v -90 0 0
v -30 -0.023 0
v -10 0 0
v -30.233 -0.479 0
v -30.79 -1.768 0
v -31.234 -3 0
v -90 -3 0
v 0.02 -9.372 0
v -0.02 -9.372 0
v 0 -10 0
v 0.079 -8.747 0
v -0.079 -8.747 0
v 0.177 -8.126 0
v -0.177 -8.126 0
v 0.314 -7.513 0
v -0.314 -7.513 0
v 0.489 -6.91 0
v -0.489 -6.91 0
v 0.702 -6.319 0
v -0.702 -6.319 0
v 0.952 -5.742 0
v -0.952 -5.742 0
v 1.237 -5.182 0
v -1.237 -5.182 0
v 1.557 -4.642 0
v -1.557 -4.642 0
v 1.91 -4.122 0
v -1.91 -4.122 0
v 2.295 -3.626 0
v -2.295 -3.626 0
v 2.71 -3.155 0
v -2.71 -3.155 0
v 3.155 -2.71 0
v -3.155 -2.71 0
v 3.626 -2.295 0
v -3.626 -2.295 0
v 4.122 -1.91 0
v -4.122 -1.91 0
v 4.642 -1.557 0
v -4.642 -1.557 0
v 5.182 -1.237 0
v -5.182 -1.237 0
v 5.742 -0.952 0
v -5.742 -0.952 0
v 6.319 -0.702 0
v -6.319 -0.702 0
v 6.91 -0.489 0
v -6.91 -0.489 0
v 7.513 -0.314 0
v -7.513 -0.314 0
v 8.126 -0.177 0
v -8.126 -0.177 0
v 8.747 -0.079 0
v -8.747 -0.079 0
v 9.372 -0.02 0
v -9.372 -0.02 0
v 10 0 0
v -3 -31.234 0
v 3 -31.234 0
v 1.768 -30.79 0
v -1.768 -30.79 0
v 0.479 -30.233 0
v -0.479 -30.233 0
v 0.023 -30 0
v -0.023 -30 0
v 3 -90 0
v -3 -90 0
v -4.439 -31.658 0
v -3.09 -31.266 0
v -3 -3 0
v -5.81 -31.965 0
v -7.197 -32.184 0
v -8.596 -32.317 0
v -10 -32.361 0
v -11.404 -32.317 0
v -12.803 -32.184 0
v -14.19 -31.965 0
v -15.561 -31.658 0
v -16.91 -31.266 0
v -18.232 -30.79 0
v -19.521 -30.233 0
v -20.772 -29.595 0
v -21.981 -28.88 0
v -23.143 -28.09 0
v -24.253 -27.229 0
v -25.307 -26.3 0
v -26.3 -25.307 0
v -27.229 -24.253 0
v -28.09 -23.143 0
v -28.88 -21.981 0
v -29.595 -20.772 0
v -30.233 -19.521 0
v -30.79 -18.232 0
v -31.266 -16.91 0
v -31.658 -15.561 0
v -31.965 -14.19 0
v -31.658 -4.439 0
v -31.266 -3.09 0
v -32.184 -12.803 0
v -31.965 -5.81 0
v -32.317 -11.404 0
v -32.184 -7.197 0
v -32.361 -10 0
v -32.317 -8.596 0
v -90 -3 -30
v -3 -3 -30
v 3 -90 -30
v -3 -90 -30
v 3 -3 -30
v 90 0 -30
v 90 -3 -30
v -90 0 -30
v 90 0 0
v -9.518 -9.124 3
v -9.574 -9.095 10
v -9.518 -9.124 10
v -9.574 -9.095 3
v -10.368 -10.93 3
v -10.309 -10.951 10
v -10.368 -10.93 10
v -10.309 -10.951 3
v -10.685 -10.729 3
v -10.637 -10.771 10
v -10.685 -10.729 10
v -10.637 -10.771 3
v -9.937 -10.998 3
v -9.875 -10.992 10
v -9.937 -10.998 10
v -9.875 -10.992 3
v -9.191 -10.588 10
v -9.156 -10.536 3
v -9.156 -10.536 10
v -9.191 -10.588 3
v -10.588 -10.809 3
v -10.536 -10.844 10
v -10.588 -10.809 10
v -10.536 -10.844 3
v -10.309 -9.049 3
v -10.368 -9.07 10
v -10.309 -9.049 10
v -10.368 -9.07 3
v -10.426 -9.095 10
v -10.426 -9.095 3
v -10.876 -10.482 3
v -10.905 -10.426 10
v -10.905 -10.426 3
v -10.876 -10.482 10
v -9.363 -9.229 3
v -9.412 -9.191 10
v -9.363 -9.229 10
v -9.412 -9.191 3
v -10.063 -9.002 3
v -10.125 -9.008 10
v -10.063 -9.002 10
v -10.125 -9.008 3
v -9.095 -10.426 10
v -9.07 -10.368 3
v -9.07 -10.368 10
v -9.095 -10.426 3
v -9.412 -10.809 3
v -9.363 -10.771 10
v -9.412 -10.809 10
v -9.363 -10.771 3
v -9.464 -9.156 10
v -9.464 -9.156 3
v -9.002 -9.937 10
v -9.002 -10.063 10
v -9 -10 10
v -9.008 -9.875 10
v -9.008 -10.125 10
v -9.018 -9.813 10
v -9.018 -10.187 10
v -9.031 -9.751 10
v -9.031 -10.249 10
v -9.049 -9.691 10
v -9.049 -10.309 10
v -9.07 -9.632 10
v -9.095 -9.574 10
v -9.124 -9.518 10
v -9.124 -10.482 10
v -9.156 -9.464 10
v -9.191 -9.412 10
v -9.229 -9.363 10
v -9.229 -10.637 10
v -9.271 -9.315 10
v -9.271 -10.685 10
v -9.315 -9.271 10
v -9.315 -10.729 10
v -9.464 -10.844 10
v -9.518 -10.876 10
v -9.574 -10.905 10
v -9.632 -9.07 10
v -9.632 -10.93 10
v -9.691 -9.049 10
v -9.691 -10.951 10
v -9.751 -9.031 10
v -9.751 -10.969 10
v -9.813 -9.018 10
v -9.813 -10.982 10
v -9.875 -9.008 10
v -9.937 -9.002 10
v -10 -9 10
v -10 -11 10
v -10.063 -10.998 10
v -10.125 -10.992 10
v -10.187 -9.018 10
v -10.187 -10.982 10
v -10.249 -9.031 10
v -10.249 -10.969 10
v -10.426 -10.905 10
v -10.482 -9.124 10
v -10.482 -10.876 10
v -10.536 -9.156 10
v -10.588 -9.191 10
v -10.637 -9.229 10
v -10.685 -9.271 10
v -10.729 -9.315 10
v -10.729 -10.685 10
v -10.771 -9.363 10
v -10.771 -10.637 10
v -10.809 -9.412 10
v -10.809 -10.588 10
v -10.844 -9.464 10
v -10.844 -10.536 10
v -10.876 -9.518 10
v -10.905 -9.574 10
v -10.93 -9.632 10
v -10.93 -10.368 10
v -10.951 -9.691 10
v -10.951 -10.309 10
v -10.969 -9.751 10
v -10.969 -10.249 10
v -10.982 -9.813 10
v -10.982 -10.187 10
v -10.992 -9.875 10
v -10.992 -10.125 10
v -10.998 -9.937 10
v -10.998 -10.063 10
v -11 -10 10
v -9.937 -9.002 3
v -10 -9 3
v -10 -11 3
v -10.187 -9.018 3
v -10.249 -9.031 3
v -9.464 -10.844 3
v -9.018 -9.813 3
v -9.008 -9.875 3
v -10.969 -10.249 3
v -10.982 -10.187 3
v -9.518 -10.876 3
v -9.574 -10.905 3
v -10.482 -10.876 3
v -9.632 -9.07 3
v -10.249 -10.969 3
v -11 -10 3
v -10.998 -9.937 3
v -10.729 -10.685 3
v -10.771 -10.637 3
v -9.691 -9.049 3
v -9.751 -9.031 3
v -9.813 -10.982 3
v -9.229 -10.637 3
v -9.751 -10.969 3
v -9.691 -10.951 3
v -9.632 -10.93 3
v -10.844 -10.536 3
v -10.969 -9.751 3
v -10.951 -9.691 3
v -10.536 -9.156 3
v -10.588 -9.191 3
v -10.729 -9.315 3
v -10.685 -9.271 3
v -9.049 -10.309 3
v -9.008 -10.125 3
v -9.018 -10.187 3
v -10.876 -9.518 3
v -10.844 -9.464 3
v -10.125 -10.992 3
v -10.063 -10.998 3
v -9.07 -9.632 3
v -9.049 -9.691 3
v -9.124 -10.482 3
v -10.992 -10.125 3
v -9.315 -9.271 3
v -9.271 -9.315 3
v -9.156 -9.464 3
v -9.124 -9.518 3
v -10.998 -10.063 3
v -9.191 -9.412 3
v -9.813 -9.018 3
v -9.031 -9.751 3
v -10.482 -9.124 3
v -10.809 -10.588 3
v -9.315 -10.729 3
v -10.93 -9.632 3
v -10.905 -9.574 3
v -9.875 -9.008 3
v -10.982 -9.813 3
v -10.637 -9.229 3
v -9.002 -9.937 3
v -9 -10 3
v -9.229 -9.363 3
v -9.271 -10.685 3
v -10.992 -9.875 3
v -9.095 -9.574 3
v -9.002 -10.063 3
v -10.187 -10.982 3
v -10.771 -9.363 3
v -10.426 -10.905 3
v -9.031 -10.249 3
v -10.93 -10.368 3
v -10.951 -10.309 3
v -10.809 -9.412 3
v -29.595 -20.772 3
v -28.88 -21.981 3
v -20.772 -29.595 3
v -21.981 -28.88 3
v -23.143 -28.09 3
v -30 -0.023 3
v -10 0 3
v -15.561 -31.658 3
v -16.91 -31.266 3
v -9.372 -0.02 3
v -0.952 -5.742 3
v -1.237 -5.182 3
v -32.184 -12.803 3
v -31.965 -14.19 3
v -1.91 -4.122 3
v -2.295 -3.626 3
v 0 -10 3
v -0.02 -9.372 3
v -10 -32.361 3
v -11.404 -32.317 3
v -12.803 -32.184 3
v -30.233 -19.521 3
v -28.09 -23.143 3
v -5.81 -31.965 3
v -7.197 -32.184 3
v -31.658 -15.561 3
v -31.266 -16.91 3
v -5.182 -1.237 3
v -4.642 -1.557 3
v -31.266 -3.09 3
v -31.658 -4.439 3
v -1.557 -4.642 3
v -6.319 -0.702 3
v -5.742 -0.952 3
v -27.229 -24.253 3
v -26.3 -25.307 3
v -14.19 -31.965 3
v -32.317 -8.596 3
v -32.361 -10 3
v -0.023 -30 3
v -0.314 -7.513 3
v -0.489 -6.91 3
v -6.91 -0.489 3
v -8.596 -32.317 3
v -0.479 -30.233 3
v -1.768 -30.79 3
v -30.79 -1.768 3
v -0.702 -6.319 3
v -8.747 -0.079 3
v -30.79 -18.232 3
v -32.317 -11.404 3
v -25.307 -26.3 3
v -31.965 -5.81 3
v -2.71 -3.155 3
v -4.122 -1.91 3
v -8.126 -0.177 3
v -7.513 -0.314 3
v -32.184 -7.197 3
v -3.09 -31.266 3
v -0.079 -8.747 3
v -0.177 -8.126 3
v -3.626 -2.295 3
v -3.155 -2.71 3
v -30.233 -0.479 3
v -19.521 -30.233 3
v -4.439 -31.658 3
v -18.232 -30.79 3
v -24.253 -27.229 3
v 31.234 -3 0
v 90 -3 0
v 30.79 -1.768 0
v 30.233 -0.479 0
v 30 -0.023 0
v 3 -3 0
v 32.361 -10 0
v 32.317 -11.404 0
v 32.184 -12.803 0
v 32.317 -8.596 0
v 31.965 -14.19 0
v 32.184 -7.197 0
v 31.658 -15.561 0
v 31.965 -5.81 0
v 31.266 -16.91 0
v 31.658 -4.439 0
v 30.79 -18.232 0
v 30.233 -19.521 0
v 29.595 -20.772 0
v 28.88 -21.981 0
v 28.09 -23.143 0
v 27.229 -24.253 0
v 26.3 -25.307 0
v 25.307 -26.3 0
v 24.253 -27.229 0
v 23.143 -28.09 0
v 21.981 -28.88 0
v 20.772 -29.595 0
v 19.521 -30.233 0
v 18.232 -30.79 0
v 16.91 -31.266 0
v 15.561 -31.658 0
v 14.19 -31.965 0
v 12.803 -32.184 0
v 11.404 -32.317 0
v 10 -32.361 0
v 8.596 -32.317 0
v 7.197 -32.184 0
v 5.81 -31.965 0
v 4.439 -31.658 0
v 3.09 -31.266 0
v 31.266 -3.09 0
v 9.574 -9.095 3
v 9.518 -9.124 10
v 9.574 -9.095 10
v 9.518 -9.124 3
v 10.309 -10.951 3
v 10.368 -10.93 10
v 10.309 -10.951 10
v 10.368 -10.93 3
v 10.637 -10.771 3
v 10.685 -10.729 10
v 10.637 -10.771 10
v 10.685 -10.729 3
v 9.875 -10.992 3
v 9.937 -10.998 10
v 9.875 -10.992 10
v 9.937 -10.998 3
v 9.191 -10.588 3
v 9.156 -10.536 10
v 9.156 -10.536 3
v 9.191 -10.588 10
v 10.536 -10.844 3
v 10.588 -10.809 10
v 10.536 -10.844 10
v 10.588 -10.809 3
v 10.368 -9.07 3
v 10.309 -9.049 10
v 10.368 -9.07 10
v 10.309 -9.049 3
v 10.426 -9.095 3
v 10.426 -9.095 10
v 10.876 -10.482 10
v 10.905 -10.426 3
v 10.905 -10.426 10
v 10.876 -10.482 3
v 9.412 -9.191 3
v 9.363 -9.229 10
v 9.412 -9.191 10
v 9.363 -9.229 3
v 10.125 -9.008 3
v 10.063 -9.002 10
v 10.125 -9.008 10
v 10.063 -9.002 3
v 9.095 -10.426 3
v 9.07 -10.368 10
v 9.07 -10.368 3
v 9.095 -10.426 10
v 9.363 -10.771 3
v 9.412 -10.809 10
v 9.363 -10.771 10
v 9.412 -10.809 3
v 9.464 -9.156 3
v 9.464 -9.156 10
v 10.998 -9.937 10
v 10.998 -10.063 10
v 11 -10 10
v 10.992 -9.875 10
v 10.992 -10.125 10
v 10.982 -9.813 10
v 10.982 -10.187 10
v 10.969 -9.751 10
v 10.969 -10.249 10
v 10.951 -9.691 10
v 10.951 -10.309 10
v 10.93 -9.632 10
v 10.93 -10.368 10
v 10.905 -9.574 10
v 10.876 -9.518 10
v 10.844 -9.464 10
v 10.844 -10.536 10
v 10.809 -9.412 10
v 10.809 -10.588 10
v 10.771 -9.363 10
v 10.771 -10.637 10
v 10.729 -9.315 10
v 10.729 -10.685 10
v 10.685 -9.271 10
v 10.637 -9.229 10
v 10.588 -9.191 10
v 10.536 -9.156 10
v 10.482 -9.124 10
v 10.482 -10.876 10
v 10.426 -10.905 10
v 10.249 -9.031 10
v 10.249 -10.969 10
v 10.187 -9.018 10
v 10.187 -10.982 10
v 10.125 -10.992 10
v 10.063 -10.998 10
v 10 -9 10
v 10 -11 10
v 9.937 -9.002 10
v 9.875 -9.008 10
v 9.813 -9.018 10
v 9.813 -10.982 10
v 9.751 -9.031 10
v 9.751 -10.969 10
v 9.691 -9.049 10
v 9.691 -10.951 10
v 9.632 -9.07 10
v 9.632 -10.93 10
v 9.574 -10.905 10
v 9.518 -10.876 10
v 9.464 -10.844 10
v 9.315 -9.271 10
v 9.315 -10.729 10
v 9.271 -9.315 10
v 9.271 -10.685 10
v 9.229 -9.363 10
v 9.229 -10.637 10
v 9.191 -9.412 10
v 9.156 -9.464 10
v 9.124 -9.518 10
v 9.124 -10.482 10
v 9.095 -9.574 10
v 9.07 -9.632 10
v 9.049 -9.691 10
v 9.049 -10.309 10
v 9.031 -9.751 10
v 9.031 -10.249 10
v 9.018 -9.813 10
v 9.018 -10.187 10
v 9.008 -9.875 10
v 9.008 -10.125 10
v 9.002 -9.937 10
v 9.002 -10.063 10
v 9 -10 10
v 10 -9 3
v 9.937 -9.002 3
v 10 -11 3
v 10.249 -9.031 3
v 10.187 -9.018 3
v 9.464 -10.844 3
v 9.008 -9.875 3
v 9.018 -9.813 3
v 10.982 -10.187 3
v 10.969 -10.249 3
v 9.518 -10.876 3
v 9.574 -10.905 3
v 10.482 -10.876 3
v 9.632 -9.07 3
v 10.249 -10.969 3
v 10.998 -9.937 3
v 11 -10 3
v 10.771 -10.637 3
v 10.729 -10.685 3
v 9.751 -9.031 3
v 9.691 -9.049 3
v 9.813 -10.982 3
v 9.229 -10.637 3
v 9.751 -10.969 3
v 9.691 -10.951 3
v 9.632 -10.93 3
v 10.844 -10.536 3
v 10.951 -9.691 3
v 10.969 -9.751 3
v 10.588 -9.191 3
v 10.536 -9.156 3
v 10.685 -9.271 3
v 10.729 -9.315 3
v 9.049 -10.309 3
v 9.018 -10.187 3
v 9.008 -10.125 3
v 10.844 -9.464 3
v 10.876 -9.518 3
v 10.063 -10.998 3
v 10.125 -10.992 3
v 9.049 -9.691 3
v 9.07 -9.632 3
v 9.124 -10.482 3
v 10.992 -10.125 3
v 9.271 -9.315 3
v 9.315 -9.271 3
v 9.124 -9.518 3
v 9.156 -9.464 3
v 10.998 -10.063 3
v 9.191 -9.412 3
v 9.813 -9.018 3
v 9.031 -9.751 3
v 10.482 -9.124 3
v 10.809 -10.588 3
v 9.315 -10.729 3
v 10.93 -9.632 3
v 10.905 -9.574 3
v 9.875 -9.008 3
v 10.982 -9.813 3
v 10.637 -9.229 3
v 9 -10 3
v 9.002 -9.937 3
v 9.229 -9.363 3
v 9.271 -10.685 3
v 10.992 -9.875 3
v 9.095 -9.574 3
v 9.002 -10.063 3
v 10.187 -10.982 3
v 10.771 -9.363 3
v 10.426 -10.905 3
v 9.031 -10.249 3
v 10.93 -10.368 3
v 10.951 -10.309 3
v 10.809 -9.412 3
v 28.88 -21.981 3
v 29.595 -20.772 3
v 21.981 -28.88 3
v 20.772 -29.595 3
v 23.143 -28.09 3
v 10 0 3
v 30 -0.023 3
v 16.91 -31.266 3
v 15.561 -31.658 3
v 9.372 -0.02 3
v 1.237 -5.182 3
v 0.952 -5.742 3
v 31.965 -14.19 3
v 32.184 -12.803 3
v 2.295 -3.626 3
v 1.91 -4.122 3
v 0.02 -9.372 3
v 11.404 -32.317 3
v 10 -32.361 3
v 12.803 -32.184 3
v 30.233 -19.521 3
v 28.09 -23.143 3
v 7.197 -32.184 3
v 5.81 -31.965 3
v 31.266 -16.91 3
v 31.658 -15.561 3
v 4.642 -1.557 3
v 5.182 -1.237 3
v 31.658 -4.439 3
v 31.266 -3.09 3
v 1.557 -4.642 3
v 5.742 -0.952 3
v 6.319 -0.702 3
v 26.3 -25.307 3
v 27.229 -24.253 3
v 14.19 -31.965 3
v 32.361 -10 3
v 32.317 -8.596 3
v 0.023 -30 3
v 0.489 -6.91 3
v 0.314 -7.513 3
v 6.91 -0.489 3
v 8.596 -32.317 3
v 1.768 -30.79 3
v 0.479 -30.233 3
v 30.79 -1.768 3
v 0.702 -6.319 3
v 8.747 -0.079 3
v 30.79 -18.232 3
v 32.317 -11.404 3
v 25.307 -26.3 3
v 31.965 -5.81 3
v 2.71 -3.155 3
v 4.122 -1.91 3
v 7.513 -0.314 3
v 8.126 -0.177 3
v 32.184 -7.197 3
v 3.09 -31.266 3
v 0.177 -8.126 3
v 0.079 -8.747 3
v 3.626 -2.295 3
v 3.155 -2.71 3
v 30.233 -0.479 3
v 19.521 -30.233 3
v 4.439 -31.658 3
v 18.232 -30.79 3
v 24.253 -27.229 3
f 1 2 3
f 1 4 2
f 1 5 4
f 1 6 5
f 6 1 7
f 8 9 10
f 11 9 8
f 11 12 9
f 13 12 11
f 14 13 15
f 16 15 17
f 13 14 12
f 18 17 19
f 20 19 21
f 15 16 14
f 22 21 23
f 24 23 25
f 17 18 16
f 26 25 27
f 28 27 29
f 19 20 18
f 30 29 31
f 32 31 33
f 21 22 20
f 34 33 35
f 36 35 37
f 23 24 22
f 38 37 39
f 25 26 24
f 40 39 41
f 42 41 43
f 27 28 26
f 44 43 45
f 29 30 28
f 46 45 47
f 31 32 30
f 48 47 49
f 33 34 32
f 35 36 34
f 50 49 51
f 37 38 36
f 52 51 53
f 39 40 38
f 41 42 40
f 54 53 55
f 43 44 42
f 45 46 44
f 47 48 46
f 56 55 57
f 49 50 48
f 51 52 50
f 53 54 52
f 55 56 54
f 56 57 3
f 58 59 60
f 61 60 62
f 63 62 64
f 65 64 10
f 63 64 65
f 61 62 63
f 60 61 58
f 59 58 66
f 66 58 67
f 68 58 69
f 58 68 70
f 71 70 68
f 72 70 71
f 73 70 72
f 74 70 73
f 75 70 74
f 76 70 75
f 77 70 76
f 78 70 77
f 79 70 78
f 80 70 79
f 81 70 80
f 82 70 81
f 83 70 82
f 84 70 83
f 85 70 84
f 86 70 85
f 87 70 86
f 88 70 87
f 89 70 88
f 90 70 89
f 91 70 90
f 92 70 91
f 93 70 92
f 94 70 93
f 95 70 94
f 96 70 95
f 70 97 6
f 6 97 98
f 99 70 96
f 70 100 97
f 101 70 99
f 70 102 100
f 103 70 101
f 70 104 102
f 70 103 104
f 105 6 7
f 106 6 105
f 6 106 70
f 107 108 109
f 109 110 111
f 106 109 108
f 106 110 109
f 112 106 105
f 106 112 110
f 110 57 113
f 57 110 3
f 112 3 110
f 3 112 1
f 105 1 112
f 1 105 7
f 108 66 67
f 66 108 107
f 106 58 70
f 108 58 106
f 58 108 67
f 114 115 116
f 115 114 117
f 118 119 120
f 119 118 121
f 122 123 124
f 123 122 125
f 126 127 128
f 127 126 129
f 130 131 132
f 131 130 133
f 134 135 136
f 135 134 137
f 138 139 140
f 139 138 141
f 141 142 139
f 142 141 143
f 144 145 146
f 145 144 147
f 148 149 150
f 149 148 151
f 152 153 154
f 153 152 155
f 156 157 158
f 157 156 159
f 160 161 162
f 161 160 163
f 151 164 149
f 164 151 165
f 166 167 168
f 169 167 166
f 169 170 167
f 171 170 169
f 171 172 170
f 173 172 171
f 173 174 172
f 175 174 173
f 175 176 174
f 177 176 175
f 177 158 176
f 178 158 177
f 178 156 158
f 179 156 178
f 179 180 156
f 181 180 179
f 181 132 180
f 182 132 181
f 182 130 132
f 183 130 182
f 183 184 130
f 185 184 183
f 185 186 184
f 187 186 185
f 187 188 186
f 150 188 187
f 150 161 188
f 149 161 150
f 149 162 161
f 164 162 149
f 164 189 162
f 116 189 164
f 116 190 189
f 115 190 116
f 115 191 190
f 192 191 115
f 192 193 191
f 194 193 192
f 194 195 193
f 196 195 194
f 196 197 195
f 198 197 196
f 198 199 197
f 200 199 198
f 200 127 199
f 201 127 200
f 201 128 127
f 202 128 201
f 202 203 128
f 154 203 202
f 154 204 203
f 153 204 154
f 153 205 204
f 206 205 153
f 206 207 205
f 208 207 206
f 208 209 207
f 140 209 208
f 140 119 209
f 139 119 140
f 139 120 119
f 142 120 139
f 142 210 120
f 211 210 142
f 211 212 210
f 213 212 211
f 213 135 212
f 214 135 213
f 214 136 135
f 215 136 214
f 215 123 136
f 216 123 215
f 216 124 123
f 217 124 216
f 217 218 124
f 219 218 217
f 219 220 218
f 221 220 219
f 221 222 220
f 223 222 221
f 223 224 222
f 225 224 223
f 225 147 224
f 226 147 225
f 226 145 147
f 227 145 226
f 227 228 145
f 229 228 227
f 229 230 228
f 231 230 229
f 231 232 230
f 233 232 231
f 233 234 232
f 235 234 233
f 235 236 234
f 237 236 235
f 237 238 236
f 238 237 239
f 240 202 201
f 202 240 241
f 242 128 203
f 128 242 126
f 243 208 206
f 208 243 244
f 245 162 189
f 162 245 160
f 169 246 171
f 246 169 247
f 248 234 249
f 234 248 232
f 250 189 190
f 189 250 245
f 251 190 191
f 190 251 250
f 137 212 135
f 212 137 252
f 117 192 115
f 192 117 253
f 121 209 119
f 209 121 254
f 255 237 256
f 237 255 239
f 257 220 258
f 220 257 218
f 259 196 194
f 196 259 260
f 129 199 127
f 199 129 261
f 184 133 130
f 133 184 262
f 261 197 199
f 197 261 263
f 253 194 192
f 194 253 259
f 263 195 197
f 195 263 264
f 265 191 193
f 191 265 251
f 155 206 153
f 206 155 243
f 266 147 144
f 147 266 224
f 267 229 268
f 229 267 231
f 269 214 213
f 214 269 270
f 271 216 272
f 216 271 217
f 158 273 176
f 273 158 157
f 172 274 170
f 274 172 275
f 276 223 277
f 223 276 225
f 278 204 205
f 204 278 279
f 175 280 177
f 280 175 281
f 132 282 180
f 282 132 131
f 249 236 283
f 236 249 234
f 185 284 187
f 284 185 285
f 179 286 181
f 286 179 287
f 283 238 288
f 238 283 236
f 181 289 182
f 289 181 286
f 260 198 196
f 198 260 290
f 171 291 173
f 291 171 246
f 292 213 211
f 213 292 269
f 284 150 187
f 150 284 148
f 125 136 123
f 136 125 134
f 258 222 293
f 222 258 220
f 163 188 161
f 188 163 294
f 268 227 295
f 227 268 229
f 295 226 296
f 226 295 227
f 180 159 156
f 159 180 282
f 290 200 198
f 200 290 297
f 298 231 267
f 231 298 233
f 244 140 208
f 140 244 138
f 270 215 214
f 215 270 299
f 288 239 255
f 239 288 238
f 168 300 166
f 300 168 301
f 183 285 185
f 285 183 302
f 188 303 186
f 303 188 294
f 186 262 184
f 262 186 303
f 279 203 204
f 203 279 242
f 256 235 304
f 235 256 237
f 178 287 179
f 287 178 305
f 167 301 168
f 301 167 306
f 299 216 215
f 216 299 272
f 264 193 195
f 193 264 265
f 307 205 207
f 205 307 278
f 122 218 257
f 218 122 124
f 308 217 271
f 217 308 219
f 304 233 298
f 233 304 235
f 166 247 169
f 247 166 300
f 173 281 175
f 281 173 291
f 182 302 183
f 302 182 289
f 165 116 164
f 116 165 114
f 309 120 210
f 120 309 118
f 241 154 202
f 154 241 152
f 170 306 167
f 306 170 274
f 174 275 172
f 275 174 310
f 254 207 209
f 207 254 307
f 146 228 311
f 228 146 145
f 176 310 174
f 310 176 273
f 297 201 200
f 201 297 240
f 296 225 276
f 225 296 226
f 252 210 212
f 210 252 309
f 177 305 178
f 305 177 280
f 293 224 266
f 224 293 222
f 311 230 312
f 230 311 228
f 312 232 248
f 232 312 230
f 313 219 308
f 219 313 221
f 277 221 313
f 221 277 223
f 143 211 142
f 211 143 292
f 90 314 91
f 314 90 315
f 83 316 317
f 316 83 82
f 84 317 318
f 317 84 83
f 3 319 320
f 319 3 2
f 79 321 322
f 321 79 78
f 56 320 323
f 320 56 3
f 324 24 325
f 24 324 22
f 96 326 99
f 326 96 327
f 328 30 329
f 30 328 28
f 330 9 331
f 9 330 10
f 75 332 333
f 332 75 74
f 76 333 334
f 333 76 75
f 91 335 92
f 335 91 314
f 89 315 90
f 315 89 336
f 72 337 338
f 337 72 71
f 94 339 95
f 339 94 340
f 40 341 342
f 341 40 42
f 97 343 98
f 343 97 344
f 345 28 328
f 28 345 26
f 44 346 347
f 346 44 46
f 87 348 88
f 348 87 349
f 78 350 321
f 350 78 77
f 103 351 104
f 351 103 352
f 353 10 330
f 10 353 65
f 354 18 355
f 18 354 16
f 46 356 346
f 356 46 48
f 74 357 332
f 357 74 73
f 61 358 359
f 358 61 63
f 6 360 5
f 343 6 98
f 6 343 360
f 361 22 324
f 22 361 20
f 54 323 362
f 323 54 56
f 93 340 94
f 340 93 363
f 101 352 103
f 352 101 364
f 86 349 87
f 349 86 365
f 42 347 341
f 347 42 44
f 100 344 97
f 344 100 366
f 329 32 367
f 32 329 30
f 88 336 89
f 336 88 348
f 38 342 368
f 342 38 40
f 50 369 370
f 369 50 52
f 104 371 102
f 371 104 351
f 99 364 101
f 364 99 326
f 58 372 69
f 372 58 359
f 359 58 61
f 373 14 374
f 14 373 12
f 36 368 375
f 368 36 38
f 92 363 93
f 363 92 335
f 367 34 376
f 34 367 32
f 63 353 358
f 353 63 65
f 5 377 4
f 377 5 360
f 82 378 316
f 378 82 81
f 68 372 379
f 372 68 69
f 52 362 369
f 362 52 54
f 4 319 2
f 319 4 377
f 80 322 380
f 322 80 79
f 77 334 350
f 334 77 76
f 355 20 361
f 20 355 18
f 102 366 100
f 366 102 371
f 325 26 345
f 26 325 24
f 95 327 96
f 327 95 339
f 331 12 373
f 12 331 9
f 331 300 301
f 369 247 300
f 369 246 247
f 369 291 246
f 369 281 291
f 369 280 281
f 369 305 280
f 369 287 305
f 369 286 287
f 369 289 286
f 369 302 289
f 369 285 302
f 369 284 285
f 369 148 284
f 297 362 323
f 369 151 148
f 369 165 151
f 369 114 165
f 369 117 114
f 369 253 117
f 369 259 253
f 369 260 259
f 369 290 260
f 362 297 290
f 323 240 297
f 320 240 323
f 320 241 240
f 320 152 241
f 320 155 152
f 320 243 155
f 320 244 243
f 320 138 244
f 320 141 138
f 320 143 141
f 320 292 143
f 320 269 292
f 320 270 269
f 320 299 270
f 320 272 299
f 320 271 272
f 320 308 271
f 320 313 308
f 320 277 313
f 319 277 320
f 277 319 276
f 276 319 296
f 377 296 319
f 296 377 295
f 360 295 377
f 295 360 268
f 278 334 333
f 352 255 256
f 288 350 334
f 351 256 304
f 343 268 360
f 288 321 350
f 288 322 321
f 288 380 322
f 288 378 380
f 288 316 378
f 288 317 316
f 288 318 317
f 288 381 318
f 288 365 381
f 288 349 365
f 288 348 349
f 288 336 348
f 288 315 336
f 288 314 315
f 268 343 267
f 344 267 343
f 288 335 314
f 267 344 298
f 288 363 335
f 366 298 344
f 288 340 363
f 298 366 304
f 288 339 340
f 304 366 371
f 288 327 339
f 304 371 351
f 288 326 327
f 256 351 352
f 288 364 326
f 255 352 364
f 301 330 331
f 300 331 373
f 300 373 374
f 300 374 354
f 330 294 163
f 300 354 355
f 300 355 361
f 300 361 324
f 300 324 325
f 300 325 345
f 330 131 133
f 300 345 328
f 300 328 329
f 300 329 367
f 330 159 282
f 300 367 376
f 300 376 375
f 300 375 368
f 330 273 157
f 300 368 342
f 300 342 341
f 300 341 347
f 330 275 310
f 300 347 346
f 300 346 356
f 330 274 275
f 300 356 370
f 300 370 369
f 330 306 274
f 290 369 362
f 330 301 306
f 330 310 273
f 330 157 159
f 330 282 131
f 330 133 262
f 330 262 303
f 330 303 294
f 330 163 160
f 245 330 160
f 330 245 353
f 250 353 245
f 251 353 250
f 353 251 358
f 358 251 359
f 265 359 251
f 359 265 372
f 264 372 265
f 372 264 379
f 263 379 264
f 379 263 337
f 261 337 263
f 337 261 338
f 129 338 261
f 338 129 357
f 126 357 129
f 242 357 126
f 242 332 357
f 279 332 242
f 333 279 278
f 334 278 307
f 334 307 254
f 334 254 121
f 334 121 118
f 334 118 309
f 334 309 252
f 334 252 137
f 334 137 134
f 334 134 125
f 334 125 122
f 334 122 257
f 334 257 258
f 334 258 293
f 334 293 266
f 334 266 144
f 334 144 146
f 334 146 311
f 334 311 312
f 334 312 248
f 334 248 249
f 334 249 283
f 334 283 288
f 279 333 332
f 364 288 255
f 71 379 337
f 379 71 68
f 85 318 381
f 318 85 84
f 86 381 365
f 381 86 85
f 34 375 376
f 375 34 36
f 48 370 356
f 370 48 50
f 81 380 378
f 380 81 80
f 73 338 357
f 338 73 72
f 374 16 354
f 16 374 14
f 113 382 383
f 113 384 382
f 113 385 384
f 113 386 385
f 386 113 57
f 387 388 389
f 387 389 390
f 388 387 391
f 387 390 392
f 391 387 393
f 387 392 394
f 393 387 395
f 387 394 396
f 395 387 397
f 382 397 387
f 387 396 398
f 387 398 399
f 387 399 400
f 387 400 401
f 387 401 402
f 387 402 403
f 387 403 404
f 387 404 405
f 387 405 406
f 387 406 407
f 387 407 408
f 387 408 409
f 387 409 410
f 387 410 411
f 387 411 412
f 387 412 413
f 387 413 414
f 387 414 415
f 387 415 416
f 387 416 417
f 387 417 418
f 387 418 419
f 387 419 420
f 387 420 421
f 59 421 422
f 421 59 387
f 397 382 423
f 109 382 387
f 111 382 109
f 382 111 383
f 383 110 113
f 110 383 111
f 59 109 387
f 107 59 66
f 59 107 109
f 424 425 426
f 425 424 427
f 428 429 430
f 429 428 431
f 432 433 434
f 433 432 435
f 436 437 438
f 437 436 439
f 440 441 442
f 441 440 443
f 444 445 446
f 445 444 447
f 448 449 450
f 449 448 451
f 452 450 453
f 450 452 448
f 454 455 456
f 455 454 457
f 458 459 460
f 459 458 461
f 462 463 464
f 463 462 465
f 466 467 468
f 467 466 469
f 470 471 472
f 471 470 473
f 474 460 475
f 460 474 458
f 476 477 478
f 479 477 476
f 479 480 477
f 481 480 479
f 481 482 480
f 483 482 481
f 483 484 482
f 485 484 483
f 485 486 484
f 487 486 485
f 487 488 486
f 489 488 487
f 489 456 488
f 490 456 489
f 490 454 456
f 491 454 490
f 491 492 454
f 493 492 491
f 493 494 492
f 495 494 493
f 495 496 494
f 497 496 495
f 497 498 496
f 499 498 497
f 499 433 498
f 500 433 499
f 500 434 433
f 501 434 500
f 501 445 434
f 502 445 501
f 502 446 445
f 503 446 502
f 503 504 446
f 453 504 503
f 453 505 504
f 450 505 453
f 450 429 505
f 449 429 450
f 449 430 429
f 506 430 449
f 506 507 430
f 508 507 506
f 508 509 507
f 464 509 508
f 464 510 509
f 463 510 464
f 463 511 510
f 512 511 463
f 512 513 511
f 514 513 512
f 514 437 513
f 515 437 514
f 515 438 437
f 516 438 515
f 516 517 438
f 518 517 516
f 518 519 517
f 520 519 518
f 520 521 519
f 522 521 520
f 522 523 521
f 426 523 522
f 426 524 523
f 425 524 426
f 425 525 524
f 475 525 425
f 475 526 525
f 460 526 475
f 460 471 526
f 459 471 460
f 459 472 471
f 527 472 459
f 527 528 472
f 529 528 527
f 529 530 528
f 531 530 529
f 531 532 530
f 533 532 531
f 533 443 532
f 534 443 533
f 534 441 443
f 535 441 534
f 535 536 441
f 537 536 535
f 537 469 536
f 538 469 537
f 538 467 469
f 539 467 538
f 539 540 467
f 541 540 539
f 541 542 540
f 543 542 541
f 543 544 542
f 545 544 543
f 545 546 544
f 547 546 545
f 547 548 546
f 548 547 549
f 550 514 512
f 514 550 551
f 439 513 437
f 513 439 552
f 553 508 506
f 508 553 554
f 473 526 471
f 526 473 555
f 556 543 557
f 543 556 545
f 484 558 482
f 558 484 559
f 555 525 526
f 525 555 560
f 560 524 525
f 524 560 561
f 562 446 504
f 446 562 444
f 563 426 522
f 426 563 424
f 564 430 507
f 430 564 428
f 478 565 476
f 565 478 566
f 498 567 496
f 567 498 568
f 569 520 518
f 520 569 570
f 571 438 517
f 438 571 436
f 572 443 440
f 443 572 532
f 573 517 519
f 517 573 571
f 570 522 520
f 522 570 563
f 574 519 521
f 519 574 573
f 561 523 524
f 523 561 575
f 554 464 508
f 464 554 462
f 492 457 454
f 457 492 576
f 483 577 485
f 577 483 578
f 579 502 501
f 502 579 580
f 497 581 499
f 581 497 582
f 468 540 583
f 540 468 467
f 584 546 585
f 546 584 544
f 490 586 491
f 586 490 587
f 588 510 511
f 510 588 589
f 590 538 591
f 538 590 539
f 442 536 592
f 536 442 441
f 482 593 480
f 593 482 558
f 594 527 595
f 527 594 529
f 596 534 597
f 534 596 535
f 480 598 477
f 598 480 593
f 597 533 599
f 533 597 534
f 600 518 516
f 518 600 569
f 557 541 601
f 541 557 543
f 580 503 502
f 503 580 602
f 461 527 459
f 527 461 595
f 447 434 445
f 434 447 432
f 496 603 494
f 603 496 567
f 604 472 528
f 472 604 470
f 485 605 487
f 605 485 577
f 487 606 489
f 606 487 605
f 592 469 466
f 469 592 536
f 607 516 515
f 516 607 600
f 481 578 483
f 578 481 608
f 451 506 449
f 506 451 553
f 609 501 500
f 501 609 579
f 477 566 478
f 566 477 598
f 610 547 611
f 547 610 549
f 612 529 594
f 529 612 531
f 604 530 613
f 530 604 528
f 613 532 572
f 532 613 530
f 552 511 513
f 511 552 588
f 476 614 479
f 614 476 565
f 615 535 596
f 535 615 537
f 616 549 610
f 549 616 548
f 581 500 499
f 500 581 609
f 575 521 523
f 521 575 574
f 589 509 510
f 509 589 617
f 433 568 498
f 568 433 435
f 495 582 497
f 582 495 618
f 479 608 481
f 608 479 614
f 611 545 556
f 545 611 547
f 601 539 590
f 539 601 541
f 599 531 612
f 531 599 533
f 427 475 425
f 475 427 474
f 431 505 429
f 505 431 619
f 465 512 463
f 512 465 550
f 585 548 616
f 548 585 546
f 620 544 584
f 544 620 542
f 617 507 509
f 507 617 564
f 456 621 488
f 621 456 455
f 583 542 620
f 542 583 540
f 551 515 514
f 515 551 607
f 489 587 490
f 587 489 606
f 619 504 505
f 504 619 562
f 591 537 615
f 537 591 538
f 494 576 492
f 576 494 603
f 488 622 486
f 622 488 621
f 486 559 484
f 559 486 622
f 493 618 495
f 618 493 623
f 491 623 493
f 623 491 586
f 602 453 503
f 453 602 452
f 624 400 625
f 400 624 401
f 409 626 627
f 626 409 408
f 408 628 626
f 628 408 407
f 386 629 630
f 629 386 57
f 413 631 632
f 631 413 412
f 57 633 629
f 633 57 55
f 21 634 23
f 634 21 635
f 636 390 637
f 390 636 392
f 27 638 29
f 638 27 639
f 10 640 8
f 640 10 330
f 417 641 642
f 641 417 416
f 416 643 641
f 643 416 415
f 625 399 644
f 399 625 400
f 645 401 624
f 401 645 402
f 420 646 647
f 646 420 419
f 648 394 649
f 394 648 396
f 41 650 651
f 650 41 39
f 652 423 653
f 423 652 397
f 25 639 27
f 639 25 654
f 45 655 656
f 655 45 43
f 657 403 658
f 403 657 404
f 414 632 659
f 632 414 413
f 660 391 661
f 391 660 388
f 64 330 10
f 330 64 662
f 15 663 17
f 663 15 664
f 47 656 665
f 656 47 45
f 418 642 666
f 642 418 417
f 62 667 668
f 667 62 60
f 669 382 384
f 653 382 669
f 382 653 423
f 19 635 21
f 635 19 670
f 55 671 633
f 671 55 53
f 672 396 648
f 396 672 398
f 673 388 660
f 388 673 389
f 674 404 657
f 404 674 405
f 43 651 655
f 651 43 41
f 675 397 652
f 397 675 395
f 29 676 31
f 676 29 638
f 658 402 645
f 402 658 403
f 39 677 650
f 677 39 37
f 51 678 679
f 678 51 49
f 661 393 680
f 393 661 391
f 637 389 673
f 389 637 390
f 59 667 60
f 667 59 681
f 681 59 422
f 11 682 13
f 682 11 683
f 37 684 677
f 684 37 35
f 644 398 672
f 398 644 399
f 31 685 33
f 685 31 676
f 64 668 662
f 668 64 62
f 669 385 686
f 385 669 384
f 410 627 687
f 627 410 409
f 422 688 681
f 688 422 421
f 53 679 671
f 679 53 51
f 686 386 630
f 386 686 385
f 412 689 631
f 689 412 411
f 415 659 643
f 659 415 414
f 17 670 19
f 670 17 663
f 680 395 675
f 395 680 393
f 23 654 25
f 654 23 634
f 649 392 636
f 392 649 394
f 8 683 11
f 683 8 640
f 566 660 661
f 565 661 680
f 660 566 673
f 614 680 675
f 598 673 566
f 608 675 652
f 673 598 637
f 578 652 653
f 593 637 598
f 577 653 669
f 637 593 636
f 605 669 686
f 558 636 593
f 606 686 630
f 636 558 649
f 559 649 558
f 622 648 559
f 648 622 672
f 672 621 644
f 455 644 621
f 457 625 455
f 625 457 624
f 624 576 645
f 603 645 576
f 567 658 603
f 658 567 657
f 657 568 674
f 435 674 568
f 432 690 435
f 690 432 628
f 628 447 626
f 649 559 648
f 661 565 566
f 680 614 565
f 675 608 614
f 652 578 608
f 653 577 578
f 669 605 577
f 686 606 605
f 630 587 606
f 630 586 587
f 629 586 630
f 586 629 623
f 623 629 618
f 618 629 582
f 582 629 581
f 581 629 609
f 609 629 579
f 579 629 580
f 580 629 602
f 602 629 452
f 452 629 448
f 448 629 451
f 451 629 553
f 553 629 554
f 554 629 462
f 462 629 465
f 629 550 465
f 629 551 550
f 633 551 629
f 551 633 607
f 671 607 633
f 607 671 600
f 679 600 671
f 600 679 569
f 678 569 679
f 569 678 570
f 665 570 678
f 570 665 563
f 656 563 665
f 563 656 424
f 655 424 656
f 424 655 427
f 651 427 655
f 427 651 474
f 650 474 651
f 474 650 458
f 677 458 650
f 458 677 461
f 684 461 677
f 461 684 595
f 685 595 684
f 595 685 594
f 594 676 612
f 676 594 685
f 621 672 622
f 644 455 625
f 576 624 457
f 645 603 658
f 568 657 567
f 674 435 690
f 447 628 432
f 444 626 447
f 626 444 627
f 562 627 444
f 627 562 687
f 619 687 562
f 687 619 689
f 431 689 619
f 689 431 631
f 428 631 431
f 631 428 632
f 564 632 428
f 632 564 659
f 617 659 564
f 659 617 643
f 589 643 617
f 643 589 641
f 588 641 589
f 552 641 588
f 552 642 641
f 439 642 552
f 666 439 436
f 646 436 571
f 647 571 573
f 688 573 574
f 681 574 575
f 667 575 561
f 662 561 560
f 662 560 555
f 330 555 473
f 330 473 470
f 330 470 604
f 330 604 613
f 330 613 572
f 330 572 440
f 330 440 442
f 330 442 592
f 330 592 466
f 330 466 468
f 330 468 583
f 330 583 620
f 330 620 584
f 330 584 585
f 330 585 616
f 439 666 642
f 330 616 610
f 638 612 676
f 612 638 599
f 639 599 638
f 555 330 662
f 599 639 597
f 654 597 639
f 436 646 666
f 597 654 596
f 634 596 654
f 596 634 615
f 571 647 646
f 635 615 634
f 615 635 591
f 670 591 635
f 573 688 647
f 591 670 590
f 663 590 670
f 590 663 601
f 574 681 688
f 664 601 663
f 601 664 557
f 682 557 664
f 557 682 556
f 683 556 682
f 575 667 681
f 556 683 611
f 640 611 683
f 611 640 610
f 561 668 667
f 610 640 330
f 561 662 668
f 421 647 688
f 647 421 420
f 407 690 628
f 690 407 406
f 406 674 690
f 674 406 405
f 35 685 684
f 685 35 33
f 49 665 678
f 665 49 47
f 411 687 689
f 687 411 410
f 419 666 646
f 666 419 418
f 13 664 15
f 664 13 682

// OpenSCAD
$fn = 100;
wall_thickness = 3;
cam_axis_inset_from_wall_outside = 10;
cam_radius = cam_axis_inset_from_wall_outside;
cam_thickness = 3;
min_cam_width = 5;
flat_length = 20;

$t=0;
cam_rotation = $t * 90;

module box(cam_radius, flat_len, camangle) {
    length = wall_thickness * 30;
    height = wall_thickness * 10;
    translate([0, 0, -height]) {
        rotate([0, 0, 180]) color("silver") cube([length, wall_thickness, height]);
        rotate([0, 0, -90]) translate([0, -wall_thickness, 0]) color("silver") cube([length, wall_thickness, height]);
    }
    
    translate([-cam_radius, -cam_radius, 0]) color("yellow") cam(cam_radius, flat_len, camangle);
}

module cam(cam_radius, flat_len, camangle) {
    outer_radius = sqrt(pow(cam_radius, 2) + pow(flat_len, 2));
    rotate([0, 0, -90]) {
        rotate([0, 0, camangle]) {
            cylinder(r=1, h=10);

            hull() {
                
                cylinder(r=cam_radius, h=cam_thickness);
                
                difference() {   
                    cylinder(r=outer_radius, h=cam_thickness);
                    union() {
                        rotate([0, 0, 90]) translate([0, -flat_len, -1]) cube([outer_radius * 2, outer_radius * 2, cam_thickness * 2]);
                        rotate([0, 0, 90]) mirror([1, -1, 0]) translate([0, -flat_len, -1]) cube([outer_radius * 2, outer_radius * 2, cam_thickness * 2]);
                    }
                }
            }
        }
    }
}

box_angle = -cam_rotation * 2;

rotate([0, 0, box_angle]) box(cam_axis_inset_from_wall_outside, flat_length, cam_rotation);

mirror([1, 0, 0]) color("grey") box(cam_axis_inset_from_wall_outside, flat_length, cam_rotation);
